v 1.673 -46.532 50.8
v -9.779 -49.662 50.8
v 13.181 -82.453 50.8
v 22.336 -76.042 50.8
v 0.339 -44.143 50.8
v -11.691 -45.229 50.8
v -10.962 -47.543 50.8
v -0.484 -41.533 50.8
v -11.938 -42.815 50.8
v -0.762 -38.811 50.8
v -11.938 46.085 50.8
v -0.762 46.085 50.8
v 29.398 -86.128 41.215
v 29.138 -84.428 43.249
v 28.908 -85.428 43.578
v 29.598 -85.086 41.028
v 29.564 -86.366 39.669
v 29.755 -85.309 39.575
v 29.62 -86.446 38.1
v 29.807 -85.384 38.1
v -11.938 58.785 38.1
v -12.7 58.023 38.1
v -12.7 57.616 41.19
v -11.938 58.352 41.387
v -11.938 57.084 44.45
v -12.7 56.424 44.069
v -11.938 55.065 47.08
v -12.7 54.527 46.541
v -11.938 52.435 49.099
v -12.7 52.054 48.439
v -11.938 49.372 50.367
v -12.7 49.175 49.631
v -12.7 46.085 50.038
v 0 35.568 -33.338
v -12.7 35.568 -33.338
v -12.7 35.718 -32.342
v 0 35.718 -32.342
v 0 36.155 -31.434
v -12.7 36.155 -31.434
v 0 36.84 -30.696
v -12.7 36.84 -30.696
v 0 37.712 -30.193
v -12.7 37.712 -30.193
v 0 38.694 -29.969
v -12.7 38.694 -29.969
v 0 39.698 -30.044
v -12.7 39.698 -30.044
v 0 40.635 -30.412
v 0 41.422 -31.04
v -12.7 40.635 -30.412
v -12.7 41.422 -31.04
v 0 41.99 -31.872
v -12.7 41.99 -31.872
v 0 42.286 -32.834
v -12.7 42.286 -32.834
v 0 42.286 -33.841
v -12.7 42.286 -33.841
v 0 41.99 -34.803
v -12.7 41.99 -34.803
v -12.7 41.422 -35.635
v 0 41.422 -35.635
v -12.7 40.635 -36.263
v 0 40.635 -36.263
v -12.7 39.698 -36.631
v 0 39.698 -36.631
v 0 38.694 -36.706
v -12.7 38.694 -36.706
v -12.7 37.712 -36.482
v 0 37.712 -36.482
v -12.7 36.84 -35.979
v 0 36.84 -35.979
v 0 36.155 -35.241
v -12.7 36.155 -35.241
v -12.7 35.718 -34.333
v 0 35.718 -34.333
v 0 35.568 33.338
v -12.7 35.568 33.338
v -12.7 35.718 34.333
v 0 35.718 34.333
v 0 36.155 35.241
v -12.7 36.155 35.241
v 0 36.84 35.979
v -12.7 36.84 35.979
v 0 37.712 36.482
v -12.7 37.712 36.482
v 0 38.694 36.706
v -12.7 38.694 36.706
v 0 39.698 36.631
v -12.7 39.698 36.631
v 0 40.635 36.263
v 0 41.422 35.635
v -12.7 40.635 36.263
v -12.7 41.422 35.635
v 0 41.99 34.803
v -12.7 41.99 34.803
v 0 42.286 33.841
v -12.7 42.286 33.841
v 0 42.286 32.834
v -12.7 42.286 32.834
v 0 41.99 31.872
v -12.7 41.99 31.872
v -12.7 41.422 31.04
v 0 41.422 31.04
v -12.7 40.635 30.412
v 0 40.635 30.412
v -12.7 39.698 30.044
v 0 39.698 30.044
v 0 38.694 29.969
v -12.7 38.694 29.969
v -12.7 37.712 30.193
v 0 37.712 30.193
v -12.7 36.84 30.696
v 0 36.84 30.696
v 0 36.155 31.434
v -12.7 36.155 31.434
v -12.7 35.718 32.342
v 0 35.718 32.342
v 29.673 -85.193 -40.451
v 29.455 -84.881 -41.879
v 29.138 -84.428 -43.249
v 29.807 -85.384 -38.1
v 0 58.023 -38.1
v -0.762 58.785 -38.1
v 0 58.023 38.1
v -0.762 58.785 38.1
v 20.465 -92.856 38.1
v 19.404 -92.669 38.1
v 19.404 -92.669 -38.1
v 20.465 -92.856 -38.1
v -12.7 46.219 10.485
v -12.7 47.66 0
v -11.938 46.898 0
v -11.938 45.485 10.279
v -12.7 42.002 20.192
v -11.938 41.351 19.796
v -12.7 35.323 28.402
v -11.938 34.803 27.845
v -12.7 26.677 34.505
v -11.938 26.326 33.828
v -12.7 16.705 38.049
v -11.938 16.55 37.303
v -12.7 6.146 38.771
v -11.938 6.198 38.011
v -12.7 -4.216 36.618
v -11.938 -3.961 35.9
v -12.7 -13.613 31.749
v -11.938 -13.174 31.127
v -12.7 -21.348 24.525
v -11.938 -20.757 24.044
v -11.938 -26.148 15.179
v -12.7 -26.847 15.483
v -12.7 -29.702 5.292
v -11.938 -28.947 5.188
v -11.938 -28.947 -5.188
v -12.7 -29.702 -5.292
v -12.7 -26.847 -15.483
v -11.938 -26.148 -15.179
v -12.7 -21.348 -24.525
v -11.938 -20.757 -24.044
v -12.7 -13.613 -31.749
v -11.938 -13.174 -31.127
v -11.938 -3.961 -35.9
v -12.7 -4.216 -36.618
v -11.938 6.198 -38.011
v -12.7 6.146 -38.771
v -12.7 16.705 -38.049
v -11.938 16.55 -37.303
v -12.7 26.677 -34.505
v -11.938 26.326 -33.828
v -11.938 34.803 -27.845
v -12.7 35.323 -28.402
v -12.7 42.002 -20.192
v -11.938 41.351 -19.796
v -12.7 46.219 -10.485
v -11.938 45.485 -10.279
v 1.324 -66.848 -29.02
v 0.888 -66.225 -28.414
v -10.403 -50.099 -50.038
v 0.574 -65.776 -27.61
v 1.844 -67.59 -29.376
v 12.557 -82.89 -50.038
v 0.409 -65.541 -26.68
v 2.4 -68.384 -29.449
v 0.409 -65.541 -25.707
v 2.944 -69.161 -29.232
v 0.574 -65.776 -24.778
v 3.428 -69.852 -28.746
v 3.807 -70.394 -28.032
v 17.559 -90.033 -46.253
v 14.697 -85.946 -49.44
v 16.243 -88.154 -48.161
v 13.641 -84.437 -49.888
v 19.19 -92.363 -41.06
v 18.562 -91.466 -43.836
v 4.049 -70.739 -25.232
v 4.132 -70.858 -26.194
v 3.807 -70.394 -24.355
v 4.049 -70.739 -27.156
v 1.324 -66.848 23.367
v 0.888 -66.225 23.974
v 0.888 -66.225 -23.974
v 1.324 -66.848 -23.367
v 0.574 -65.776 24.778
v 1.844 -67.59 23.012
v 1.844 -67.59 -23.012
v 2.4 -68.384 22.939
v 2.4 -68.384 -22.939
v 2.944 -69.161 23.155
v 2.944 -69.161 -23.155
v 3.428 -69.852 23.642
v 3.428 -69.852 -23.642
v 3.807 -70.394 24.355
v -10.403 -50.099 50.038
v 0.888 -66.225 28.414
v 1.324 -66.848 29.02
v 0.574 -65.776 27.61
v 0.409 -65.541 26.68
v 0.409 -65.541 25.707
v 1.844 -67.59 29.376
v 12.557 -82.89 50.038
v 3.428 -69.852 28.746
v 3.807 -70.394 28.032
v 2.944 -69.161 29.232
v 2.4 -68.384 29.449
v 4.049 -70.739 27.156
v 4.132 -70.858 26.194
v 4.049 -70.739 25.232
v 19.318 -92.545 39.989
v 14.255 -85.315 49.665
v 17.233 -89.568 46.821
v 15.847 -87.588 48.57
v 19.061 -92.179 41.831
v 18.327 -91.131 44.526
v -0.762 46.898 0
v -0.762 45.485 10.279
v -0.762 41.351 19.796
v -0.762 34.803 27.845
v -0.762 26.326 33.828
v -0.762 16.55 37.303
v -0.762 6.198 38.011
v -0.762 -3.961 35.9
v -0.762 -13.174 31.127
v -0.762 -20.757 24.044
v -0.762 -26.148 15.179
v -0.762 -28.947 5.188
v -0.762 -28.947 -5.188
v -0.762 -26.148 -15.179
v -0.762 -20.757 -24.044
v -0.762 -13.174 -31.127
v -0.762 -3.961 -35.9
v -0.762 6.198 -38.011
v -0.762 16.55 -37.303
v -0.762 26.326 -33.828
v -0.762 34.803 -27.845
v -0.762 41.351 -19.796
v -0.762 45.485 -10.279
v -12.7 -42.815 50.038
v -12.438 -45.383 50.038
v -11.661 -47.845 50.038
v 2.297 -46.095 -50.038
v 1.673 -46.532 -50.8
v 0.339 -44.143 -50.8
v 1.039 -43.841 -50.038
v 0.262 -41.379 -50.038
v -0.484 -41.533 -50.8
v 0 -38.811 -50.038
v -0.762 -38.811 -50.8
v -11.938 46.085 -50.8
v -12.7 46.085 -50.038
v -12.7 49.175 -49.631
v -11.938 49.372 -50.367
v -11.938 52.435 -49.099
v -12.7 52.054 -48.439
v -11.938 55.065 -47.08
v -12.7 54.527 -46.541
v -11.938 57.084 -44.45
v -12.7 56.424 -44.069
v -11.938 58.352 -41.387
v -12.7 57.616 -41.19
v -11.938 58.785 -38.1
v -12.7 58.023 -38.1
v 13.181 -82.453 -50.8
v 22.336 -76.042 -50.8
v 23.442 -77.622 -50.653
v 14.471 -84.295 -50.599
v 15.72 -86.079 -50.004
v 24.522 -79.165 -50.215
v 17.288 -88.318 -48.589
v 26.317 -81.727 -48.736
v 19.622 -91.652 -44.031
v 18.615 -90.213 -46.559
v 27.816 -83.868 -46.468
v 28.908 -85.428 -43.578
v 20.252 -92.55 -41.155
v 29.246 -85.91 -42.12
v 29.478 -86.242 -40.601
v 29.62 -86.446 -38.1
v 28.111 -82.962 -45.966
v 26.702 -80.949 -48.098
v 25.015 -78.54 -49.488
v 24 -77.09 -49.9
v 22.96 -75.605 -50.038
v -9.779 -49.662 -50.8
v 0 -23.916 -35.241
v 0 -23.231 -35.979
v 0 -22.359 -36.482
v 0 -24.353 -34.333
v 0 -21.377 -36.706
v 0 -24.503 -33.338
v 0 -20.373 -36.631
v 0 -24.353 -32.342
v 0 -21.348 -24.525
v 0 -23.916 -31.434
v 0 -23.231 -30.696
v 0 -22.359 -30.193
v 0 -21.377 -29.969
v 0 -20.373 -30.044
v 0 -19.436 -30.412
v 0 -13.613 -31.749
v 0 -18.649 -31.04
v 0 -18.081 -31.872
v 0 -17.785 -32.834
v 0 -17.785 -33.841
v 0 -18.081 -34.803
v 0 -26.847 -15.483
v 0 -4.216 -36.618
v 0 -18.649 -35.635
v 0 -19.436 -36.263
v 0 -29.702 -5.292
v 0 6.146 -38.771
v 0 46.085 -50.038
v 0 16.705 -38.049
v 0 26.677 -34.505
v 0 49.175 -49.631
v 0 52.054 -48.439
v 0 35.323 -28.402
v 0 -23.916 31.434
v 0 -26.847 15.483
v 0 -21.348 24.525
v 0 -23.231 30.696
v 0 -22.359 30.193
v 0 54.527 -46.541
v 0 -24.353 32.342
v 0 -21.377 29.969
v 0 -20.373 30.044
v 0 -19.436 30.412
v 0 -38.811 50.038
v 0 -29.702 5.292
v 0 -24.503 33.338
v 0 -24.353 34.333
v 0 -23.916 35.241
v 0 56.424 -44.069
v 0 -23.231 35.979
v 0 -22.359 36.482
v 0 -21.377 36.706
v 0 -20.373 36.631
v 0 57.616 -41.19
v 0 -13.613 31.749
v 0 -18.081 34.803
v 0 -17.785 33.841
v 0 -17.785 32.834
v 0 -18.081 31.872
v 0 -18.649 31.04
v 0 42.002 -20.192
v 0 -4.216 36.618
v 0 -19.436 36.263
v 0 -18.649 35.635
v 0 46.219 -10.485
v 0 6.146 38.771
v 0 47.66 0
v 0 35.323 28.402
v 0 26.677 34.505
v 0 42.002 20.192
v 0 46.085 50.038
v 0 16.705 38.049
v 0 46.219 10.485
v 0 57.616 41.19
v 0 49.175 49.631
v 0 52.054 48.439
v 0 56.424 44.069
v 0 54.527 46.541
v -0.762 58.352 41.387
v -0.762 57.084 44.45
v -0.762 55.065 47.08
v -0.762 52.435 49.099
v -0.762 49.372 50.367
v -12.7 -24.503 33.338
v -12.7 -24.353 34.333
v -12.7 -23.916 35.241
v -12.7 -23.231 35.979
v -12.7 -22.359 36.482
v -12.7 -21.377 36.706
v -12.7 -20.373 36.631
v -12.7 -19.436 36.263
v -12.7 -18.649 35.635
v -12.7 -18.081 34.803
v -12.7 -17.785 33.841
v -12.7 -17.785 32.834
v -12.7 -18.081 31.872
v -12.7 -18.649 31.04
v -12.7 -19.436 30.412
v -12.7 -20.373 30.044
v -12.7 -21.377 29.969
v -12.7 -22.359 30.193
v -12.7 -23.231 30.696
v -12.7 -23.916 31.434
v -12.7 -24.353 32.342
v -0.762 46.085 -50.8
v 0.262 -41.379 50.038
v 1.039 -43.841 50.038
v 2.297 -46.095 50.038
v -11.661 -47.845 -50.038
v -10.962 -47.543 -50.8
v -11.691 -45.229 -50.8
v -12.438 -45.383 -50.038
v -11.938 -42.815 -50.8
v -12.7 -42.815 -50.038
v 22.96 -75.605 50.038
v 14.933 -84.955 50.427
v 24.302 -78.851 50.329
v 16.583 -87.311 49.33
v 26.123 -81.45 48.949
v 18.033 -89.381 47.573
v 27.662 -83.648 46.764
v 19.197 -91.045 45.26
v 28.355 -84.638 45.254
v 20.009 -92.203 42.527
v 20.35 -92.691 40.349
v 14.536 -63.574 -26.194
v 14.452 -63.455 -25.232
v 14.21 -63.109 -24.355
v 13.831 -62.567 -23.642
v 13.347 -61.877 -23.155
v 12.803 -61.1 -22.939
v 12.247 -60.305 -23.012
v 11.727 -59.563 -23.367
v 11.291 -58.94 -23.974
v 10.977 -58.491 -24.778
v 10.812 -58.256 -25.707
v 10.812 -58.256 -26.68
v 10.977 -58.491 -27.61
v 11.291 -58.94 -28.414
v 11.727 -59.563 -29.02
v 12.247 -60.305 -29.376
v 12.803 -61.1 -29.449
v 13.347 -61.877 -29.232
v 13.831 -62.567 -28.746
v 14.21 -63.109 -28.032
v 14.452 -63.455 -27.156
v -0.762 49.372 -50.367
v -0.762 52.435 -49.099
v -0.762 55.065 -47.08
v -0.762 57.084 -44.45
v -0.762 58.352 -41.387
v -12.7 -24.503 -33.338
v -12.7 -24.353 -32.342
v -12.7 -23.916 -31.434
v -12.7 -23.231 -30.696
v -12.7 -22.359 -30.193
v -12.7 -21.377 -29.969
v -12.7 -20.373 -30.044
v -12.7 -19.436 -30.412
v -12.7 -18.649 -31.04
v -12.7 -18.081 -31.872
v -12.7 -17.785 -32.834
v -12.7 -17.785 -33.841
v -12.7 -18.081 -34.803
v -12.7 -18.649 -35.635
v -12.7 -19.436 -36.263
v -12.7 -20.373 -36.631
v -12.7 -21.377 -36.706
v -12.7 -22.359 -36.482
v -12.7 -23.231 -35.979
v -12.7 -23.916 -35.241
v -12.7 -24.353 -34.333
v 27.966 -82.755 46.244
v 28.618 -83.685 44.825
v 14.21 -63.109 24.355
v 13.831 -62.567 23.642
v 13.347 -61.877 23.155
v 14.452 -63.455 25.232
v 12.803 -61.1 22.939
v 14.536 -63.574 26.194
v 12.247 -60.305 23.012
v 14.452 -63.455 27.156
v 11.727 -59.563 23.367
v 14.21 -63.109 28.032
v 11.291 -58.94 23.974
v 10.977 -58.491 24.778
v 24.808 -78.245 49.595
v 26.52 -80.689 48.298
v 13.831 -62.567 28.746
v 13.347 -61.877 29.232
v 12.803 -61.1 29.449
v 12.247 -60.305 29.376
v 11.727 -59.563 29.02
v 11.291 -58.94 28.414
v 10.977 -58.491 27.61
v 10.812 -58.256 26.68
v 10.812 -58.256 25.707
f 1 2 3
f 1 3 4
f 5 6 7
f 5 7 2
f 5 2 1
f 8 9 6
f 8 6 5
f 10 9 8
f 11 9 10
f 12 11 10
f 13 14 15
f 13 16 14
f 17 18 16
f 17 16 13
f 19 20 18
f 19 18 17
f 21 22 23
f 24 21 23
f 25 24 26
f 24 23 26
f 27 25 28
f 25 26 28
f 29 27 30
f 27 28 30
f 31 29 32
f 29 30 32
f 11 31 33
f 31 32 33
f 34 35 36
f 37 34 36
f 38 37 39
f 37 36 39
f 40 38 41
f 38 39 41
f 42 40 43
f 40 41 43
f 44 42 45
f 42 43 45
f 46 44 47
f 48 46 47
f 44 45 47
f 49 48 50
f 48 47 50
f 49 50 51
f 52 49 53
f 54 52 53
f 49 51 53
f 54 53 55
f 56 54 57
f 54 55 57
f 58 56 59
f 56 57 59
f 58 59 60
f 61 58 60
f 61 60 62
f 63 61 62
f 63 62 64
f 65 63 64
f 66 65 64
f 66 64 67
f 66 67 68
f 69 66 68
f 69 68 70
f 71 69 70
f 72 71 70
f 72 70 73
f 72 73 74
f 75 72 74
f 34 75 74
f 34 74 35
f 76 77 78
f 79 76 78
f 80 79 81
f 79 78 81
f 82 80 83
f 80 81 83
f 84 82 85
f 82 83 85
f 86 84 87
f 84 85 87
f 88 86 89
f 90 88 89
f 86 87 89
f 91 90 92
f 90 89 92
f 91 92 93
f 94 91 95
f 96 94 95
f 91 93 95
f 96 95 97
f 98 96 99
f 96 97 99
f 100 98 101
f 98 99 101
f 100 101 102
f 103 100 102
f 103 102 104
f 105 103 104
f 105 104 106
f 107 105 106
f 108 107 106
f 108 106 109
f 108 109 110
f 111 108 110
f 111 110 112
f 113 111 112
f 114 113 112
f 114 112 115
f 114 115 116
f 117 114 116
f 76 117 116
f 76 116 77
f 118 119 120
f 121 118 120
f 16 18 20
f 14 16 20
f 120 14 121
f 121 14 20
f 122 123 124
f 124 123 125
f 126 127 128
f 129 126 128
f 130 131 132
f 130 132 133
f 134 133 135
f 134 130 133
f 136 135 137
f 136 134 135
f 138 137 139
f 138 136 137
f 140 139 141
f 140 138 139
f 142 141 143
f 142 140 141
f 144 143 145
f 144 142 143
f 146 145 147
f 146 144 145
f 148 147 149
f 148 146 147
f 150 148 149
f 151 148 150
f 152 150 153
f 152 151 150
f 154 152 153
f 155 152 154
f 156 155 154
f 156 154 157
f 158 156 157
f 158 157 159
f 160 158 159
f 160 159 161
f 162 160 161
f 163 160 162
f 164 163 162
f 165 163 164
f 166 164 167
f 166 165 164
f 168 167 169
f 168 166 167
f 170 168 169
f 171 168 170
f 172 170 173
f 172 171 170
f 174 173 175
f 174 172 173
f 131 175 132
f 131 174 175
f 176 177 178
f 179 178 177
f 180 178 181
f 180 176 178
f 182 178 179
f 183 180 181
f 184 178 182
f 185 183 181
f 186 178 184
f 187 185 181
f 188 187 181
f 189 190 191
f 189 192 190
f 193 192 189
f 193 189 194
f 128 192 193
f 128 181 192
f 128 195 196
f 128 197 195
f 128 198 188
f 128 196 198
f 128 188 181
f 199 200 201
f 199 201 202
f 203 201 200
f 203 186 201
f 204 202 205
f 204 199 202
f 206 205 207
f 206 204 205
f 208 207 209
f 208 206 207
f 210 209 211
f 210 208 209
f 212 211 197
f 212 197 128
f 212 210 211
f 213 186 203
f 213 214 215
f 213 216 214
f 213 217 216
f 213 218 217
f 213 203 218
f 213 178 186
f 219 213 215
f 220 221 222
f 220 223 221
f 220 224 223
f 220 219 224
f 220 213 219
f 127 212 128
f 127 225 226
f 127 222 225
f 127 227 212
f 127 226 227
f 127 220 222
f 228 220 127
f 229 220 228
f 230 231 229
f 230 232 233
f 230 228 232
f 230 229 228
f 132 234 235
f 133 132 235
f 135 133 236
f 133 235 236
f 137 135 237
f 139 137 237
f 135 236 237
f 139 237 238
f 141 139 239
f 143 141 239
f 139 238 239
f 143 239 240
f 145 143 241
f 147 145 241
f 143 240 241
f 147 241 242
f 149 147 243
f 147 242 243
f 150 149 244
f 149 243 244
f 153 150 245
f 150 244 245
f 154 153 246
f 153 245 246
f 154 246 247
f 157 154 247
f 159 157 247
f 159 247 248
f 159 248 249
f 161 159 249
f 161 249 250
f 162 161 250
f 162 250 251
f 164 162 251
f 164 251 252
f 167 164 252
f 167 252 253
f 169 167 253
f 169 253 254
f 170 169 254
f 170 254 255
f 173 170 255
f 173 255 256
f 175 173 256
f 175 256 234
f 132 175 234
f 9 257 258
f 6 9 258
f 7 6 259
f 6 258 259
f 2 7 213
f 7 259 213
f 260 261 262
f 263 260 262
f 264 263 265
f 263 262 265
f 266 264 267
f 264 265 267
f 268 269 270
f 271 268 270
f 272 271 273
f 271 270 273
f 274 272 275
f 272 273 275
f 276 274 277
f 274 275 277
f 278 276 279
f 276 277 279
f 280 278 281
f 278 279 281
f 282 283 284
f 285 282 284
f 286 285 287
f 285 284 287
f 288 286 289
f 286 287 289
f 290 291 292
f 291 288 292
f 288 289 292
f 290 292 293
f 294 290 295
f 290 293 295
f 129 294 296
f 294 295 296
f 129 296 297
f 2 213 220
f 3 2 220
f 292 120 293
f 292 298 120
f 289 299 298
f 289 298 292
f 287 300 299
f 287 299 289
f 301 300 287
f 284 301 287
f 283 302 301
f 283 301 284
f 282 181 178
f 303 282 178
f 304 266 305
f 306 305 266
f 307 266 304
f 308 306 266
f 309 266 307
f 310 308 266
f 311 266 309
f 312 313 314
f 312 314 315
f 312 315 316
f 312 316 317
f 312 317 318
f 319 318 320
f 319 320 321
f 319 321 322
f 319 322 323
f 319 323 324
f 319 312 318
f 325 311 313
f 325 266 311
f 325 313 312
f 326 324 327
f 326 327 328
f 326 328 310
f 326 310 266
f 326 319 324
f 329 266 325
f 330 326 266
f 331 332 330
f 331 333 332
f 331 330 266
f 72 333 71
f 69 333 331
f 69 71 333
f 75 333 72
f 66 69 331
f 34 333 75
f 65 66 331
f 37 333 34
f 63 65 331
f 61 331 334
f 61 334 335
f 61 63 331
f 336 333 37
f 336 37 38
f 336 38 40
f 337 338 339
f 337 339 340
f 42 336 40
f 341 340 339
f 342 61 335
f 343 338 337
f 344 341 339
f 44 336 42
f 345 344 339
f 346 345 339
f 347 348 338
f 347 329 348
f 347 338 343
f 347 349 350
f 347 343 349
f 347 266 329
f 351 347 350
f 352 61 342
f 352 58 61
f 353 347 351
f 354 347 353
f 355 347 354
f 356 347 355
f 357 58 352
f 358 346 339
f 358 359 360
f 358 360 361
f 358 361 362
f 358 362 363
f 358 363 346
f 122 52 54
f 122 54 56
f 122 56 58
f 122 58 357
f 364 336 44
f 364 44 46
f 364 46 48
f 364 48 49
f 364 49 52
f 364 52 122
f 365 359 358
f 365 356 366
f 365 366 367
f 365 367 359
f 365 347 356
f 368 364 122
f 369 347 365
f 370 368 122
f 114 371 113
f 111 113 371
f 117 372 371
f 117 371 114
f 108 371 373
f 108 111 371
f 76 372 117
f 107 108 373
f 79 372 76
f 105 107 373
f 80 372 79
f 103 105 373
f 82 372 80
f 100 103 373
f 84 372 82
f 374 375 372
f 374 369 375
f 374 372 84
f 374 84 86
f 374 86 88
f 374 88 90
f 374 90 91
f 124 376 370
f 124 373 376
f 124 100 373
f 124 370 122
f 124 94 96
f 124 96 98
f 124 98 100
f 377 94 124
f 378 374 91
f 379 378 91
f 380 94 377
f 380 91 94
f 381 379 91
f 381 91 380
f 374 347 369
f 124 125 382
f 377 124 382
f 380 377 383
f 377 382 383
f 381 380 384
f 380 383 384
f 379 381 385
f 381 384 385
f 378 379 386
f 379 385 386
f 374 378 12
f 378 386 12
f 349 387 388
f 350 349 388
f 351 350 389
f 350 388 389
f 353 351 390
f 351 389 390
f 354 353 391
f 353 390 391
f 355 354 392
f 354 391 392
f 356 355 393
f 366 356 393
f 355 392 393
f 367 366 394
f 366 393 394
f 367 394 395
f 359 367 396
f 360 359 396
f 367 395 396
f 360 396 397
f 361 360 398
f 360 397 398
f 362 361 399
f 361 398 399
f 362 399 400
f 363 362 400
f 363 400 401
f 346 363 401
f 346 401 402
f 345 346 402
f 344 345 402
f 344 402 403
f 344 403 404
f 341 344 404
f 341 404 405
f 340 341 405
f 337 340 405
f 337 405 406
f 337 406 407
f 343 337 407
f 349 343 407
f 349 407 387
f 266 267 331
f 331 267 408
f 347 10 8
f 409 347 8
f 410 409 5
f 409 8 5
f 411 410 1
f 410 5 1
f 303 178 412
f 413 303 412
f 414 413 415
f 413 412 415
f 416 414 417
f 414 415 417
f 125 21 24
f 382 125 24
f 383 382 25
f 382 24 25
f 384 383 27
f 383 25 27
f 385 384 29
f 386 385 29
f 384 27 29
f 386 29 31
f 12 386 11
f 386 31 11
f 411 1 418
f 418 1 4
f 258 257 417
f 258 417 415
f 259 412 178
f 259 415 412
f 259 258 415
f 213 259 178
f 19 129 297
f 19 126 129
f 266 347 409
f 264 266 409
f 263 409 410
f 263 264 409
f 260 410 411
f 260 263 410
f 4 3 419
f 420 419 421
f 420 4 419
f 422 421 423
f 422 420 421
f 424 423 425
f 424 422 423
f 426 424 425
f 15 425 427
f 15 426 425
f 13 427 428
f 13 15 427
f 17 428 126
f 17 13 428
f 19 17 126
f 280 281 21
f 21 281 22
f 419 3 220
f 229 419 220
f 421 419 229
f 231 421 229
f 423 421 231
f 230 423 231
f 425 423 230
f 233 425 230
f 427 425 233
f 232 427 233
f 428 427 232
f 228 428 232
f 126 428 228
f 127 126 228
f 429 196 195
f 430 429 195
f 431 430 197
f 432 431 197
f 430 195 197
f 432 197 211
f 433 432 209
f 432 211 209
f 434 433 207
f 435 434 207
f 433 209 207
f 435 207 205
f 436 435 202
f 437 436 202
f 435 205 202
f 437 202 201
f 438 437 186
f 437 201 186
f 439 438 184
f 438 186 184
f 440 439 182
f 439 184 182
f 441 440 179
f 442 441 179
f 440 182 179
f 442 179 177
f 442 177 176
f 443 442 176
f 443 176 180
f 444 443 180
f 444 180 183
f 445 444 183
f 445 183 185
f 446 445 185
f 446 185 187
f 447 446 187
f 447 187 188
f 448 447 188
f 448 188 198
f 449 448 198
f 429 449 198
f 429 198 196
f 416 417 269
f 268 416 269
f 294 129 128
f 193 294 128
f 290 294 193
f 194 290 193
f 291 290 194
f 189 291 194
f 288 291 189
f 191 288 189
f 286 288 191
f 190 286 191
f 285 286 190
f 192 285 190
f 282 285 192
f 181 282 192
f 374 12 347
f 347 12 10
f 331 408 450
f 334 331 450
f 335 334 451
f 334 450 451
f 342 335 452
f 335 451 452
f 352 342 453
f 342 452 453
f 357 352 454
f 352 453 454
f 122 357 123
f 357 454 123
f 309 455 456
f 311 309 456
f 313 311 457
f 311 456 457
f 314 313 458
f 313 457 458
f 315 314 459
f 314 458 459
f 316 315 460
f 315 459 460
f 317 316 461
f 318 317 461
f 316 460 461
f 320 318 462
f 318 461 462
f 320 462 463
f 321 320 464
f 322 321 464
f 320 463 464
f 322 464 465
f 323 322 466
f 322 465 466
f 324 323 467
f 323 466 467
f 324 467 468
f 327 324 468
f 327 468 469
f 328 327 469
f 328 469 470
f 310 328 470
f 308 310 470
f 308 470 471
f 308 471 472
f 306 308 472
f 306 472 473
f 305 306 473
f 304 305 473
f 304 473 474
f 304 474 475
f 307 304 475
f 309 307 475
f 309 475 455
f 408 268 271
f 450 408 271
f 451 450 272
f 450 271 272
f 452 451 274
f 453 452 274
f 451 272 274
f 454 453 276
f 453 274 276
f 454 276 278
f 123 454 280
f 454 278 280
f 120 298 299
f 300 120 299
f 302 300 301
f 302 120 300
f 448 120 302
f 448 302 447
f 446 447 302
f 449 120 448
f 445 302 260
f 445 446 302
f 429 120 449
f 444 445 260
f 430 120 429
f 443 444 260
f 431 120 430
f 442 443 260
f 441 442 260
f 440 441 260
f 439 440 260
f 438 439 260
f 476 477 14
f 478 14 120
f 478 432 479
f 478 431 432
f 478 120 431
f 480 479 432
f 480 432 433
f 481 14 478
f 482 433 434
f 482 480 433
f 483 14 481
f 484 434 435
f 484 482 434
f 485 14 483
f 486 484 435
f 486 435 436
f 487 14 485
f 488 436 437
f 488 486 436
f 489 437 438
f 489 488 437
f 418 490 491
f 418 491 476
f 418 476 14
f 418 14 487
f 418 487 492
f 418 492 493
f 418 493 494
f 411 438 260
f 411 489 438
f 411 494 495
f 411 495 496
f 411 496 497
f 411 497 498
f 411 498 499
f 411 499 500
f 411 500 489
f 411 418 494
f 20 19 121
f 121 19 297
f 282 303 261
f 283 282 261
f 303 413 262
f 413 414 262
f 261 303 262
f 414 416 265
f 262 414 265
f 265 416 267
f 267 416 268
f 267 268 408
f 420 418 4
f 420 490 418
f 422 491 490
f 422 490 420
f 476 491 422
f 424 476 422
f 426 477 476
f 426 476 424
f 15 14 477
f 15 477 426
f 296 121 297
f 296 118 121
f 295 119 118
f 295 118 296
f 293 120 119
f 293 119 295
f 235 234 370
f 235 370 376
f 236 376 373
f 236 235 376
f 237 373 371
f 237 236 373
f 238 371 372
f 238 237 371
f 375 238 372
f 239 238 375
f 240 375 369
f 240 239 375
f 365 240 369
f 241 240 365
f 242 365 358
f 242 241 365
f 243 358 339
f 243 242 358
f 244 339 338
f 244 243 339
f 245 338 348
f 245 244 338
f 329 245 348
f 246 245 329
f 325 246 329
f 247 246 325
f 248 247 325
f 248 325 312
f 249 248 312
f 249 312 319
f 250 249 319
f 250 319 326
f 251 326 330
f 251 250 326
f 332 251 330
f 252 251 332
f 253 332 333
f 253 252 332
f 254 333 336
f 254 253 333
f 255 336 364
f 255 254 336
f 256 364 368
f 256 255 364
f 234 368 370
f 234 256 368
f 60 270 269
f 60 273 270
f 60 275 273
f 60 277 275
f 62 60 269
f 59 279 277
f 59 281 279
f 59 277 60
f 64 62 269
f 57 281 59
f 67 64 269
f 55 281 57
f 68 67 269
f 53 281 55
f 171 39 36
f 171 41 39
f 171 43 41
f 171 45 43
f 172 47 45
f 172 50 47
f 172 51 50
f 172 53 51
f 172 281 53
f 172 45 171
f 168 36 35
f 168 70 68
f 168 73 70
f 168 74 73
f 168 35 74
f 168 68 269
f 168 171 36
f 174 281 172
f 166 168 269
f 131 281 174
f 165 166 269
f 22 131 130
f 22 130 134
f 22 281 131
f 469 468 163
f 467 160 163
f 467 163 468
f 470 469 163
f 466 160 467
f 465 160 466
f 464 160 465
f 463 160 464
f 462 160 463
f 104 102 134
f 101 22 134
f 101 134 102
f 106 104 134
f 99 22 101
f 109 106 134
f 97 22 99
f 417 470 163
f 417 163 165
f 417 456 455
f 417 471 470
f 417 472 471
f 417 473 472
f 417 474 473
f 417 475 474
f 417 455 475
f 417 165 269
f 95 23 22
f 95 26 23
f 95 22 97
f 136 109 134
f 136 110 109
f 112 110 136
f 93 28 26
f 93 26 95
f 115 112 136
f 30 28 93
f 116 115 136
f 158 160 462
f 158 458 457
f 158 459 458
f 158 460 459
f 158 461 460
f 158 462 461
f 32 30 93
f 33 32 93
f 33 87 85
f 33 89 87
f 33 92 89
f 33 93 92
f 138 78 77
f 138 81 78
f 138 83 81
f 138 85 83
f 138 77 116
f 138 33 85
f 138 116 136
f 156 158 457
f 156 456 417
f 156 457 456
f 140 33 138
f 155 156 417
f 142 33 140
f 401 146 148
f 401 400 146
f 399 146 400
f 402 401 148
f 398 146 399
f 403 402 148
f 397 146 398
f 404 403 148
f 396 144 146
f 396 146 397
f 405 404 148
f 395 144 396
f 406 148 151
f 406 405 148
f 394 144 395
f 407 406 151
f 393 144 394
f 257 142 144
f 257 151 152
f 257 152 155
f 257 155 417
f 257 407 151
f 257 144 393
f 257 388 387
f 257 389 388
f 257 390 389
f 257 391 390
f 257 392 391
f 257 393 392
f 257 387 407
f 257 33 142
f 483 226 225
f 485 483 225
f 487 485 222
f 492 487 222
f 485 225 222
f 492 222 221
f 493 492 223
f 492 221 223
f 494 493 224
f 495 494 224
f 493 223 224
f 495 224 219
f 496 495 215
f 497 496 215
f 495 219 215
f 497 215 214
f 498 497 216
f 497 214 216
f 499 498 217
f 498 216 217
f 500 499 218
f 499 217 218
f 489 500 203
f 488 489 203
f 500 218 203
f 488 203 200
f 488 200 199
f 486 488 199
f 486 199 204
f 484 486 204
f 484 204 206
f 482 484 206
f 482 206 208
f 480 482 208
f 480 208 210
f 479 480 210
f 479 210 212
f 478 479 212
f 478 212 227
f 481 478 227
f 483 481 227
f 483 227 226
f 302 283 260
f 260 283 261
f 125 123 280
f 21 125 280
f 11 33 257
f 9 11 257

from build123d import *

# Parameters (mm, degrees)
F1_DEPTH = 50.8
F3_D     = 6.7564
F4_R     = 38.1
F5_DEPTH = 13.462
F6_R     = 12.7
F7_R     = 12.7
F8_SIZE  = 0.762
F10_D    = 6.5278


with BuildPart() as f1:
    # F0 (on Top) → F1 (new body, symmetric)
    with BuildSketch(Plane.XY):
        Polygon((0, -42.8148043404), (0, 58.7851956596), (-12.7, 58.7851956596), (-12.7, -46.8190989592), (19.8412804977, -93.2928638389), (30.2445114602, -86.0084430972), (29.1376829666, -84.4277281903), align=None)
    extrude(amount=F1_DEPTH, both=True)

    # F3 (through all)
    with Locations(Plane.YZ):
        with Locations((38.9459957701, 33.3375), (38.9459957701, -33.3375), (-21.1250042299, -33.3375), (-21.1250042299, 33.3375)):
            Hole(F3_D / 2)

    # F4 (on face) → F5 (cut)
    with BuildSketch(Plane.YZ):
        with Locations((8.7980022654, 0)):
            Circle(F4_R)
    extrude(amount=-F5_DEPTH, mode=Mode.SUBTRACT)

    # F6
    f6_edges = [f1.edges().sort_by_distance(p)[0] for p in [
        (-6.35, 58.785196, -50.8),
        (-6.35, 58.785196, 50.8),
        (25.042896, -89.650653, 50.8),
        (25.042896, -89.650653, -50.8),
    ]]
    fillet(f6_edges, radius=F6_R)

    # F7
    f7_edges = [f1.edges().sort_by_distance(p)[0] for p in [
        (0, -42.814804, 0),
        (-12.7, -46.819099, 0),
    ]]
    fillet(f7_edges, radius=F7_R)

    # F8
    f8_edges = [f1.edges().sort_by_distance(p)[0] for p in [
        (0, -29.301998, 0),
        (-12.7, -29.301998, 0),
        (0, 58.785196, 0),
        (0, 55.065452, -47.080256),
        (0, 3.637343, -50.8),
        (0.587795, -42.629473, -50.8),
        (28.110954, -82.961407, -47.080256),
        (12.62843, -60.850071, -50.8),
        (30.244511, -86.008443, 0),
        (28.110954, -82.961407, 47.080256),
        (12.62843, -60.850071, 50.8),
        (-12.7, 55.065452, 47.080256),
        (-12.7, 1.635196, 50.8),
        (-12.7, 58.785196, 0),
    ]]
    chamfer(f8_edges, length=F8_SIZE)

    # F10 (through all)
    with Locations(Plane(origin=(-20.1163778496, -14.0856394117, 0), x_dir=(-0.5735764364, 0.8191520443, 0), z_dir=(0.8191520443, 0.5735764364, 0))):
        with Locations((-57.15, -26.19375), (-57.15, 26.19375)):
            Hole(F10_D / 2)


solid = f1.part
